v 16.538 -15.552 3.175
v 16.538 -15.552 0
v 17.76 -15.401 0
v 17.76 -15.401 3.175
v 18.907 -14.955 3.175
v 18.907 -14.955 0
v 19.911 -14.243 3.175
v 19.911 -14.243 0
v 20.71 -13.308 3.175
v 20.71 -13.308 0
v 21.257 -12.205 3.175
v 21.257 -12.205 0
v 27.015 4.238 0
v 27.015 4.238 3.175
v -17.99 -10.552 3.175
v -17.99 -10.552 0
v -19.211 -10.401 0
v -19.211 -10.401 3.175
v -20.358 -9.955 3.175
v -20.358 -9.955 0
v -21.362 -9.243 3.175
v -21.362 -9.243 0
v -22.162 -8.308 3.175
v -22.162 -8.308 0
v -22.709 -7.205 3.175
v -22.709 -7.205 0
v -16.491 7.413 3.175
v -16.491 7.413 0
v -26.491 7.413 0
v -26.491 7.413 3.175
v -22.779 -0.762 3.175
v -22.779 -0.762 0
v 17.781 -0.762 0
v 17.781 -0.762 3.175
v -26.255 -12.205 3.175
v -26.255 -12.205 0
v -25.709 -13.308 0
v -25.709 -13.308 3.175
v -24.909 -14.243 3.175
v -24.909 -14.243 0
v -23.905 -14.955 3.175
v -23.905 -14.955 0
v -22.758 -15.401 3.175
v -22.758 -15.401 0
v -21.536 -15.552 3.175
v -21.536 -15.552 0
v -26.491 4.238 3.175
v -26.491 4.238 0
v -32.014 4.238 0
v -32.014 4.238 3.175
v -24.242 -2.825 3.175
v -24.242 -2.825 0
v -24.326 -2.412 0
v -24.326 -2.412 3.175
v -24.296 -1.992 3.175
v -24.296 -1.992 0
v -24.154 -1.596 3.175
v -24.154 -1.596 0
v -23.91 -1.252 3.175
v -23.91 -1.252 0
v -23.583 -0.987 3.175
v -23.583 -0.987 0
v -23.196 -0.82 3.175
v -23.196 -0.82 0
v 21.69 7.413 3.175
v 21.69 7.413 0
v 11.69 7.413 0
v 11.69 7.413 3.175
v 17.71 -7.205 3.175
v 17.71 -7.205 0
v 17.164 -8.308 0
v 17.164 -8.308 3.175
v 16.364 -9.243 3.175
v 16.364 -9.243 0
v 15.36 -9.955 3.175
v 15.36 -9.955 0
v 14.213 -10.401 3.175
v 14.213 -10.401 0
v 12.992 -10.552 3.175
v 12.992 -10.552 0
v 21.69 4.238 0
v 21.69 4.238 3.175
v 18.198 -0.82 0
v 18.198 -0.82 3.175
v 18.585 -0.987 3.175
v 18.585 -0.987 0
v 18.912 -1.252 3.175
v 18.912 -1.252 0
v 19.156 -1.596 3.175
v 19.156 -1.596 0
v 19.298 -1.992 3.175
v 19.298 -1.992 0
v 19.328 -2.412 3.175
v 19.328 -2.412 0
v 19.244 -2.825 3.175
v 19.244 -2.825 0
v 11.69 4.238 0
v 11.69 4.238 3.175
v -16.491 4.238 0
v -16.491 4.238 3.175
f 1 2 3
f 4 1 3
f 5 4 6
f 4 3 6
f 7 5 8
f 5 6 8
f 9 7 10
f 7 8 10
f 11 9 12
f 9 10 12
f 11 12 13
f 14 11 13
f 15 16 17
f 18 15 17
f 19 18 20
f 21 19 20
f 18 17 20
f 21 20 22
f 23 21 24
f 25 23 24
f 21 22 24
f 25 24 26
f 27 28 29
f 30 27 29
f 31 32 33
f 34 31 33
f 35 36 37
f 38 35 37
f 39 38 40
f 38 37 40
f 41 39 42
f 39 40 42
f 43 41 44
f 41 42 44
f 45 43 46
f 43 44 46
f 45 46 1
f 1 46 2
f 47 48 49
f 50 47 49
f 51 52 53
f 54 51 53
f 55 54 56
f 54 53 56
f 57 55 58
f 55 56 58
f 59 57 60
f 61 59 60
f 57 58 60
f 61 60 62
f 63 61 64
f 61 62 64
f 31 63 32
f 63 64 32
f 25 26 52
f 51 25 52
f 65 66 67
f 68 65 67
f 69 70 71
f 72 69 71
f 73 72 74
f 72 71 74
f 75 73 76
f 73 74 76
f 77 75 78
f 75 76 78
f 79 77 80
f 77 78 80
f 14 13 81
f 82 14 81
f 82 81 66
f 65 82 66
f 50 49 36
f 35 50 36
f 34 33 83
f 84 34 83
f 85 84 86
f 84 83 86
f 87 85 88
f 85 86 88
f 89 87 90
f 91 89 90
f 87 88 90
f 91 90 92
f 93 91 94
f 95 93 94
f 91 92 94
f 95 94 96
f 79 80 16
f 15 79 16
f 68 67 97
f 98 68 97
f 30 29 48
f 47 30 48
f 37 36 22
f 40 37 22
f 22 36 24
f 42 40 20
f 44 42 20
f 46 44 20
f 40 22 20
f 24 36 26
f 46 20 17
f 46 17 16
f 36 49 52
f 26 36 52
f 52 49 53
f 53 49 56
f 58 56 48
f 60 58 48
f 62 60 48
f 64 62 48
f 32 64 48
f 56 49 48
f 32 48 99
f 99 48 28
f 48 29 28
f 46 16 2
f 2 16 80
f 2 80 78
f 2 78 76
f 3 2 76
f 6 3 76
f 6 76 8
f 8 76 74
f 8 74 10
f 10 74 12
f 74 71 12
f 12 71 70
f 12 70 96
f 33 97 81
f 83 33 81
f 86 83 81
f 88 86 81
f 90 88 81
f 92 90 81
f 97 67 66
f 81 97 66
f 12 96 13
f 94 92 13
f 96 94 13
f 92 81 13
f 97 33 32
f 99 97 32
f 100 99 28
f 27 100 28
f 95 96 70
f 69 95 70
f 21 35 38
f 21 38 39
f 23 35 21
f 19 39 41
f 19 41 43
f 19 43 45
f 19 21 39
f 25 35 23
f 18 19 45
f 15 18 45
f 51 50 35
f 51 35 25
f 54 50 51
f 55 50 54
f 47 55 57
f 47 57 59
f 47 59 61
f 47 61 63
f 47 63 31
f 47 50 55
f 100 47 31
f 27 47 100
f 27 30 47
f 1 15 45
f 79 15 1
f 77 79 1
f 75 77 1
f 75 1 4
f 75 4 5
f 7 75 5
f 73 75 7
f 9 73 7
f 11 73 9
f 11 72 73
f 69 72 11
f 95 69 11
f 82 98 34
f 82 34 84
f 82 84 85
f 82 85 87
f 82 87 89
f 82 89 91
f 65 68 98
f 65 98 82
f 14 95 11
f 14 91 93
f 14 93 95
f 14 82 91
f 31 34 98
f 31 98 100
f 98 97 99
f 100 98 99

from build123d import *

# Parameters (mm, degrees)
F1_DEPTH = 3.175


with BuildPart() as f1:
    # F0 (on Top) → F1 (new body)
    with BuildSketch(Plane.XY):
        with BuildLine():
            Line((27.01547, 4.237531), (21.689913, 4.237531))
            Line((21.689913, 4.237531), (21.689913, 7.412531))
            Line((21.689913, 7.412531), (11.689913, 7.412531))
            Line((11.689913, 7.412531), (11.689913, 4.237531))
            Line((11.689913, 4.237531), (-16.491257, 4.237531))
            Line((-16.491257, 4.237531), (-16.491257, 7.412531))
            Line((-16.491257, 7.412531), (-26.491257, 7.412531))
            Line((-26.491257, 7.412531), (-26.491257, 4.237531))
            Line((-26.491257, 4.237531), (-32.01359, 4.237531))
            Line((-32.01359, 4.237531), (-26.255299, -12.204799))
            ThreePointArc((-26.255299, -12.204799), (-24.429136, -14.630345), (-21.536318, -15.552159))
            Line((-21.536318, -15.552159), (16.538198, -15.552159))
            ThreePointArc((16.538198, -15.552159), (19.431017, -14.630345), (21.257179, -12.204799))
            Line((21.257179, -12.204799), (27.01547, 4.237531))
        make_face()
        with BuildLine():
            ThreePointArc((17.710482, -7.204799), (15.884319, -9.630345), (12.991501, -10.552159))
            Line((12.991501, -10.552159), (-17.989621, -10.552159))
            ThreePointArc((-17.989621, -10.552159), (-20.882439, -9.630345), (-22.708601, -7.204799))
            Line((-22.708601, -7.204799), (-24.242376, -2.825232))
            ThreePointArc((-24.242376, -2.825232), (-24.043687, -1.415837), (-22.779177, -0.76247))
            Line((-22.779177, -0.76247), (-7.49906, -0.76247))
            Line((-7.49906, -0.76247), (2.50094, -0.76247))
            Line((2.50094, -0.76247), (17.781058, -0.76247))
            ThreePointArc((17.781058, -0.76247), (19.045567, -1.415837), (19.244256, -2.825232))
            Line((19.244256, -2.825232), (17.710482, -7.204799))
        make_face(mode=Mode.SUBTRACT)
    extrude(amount=F1_DEPTH)


solid = f1.part
